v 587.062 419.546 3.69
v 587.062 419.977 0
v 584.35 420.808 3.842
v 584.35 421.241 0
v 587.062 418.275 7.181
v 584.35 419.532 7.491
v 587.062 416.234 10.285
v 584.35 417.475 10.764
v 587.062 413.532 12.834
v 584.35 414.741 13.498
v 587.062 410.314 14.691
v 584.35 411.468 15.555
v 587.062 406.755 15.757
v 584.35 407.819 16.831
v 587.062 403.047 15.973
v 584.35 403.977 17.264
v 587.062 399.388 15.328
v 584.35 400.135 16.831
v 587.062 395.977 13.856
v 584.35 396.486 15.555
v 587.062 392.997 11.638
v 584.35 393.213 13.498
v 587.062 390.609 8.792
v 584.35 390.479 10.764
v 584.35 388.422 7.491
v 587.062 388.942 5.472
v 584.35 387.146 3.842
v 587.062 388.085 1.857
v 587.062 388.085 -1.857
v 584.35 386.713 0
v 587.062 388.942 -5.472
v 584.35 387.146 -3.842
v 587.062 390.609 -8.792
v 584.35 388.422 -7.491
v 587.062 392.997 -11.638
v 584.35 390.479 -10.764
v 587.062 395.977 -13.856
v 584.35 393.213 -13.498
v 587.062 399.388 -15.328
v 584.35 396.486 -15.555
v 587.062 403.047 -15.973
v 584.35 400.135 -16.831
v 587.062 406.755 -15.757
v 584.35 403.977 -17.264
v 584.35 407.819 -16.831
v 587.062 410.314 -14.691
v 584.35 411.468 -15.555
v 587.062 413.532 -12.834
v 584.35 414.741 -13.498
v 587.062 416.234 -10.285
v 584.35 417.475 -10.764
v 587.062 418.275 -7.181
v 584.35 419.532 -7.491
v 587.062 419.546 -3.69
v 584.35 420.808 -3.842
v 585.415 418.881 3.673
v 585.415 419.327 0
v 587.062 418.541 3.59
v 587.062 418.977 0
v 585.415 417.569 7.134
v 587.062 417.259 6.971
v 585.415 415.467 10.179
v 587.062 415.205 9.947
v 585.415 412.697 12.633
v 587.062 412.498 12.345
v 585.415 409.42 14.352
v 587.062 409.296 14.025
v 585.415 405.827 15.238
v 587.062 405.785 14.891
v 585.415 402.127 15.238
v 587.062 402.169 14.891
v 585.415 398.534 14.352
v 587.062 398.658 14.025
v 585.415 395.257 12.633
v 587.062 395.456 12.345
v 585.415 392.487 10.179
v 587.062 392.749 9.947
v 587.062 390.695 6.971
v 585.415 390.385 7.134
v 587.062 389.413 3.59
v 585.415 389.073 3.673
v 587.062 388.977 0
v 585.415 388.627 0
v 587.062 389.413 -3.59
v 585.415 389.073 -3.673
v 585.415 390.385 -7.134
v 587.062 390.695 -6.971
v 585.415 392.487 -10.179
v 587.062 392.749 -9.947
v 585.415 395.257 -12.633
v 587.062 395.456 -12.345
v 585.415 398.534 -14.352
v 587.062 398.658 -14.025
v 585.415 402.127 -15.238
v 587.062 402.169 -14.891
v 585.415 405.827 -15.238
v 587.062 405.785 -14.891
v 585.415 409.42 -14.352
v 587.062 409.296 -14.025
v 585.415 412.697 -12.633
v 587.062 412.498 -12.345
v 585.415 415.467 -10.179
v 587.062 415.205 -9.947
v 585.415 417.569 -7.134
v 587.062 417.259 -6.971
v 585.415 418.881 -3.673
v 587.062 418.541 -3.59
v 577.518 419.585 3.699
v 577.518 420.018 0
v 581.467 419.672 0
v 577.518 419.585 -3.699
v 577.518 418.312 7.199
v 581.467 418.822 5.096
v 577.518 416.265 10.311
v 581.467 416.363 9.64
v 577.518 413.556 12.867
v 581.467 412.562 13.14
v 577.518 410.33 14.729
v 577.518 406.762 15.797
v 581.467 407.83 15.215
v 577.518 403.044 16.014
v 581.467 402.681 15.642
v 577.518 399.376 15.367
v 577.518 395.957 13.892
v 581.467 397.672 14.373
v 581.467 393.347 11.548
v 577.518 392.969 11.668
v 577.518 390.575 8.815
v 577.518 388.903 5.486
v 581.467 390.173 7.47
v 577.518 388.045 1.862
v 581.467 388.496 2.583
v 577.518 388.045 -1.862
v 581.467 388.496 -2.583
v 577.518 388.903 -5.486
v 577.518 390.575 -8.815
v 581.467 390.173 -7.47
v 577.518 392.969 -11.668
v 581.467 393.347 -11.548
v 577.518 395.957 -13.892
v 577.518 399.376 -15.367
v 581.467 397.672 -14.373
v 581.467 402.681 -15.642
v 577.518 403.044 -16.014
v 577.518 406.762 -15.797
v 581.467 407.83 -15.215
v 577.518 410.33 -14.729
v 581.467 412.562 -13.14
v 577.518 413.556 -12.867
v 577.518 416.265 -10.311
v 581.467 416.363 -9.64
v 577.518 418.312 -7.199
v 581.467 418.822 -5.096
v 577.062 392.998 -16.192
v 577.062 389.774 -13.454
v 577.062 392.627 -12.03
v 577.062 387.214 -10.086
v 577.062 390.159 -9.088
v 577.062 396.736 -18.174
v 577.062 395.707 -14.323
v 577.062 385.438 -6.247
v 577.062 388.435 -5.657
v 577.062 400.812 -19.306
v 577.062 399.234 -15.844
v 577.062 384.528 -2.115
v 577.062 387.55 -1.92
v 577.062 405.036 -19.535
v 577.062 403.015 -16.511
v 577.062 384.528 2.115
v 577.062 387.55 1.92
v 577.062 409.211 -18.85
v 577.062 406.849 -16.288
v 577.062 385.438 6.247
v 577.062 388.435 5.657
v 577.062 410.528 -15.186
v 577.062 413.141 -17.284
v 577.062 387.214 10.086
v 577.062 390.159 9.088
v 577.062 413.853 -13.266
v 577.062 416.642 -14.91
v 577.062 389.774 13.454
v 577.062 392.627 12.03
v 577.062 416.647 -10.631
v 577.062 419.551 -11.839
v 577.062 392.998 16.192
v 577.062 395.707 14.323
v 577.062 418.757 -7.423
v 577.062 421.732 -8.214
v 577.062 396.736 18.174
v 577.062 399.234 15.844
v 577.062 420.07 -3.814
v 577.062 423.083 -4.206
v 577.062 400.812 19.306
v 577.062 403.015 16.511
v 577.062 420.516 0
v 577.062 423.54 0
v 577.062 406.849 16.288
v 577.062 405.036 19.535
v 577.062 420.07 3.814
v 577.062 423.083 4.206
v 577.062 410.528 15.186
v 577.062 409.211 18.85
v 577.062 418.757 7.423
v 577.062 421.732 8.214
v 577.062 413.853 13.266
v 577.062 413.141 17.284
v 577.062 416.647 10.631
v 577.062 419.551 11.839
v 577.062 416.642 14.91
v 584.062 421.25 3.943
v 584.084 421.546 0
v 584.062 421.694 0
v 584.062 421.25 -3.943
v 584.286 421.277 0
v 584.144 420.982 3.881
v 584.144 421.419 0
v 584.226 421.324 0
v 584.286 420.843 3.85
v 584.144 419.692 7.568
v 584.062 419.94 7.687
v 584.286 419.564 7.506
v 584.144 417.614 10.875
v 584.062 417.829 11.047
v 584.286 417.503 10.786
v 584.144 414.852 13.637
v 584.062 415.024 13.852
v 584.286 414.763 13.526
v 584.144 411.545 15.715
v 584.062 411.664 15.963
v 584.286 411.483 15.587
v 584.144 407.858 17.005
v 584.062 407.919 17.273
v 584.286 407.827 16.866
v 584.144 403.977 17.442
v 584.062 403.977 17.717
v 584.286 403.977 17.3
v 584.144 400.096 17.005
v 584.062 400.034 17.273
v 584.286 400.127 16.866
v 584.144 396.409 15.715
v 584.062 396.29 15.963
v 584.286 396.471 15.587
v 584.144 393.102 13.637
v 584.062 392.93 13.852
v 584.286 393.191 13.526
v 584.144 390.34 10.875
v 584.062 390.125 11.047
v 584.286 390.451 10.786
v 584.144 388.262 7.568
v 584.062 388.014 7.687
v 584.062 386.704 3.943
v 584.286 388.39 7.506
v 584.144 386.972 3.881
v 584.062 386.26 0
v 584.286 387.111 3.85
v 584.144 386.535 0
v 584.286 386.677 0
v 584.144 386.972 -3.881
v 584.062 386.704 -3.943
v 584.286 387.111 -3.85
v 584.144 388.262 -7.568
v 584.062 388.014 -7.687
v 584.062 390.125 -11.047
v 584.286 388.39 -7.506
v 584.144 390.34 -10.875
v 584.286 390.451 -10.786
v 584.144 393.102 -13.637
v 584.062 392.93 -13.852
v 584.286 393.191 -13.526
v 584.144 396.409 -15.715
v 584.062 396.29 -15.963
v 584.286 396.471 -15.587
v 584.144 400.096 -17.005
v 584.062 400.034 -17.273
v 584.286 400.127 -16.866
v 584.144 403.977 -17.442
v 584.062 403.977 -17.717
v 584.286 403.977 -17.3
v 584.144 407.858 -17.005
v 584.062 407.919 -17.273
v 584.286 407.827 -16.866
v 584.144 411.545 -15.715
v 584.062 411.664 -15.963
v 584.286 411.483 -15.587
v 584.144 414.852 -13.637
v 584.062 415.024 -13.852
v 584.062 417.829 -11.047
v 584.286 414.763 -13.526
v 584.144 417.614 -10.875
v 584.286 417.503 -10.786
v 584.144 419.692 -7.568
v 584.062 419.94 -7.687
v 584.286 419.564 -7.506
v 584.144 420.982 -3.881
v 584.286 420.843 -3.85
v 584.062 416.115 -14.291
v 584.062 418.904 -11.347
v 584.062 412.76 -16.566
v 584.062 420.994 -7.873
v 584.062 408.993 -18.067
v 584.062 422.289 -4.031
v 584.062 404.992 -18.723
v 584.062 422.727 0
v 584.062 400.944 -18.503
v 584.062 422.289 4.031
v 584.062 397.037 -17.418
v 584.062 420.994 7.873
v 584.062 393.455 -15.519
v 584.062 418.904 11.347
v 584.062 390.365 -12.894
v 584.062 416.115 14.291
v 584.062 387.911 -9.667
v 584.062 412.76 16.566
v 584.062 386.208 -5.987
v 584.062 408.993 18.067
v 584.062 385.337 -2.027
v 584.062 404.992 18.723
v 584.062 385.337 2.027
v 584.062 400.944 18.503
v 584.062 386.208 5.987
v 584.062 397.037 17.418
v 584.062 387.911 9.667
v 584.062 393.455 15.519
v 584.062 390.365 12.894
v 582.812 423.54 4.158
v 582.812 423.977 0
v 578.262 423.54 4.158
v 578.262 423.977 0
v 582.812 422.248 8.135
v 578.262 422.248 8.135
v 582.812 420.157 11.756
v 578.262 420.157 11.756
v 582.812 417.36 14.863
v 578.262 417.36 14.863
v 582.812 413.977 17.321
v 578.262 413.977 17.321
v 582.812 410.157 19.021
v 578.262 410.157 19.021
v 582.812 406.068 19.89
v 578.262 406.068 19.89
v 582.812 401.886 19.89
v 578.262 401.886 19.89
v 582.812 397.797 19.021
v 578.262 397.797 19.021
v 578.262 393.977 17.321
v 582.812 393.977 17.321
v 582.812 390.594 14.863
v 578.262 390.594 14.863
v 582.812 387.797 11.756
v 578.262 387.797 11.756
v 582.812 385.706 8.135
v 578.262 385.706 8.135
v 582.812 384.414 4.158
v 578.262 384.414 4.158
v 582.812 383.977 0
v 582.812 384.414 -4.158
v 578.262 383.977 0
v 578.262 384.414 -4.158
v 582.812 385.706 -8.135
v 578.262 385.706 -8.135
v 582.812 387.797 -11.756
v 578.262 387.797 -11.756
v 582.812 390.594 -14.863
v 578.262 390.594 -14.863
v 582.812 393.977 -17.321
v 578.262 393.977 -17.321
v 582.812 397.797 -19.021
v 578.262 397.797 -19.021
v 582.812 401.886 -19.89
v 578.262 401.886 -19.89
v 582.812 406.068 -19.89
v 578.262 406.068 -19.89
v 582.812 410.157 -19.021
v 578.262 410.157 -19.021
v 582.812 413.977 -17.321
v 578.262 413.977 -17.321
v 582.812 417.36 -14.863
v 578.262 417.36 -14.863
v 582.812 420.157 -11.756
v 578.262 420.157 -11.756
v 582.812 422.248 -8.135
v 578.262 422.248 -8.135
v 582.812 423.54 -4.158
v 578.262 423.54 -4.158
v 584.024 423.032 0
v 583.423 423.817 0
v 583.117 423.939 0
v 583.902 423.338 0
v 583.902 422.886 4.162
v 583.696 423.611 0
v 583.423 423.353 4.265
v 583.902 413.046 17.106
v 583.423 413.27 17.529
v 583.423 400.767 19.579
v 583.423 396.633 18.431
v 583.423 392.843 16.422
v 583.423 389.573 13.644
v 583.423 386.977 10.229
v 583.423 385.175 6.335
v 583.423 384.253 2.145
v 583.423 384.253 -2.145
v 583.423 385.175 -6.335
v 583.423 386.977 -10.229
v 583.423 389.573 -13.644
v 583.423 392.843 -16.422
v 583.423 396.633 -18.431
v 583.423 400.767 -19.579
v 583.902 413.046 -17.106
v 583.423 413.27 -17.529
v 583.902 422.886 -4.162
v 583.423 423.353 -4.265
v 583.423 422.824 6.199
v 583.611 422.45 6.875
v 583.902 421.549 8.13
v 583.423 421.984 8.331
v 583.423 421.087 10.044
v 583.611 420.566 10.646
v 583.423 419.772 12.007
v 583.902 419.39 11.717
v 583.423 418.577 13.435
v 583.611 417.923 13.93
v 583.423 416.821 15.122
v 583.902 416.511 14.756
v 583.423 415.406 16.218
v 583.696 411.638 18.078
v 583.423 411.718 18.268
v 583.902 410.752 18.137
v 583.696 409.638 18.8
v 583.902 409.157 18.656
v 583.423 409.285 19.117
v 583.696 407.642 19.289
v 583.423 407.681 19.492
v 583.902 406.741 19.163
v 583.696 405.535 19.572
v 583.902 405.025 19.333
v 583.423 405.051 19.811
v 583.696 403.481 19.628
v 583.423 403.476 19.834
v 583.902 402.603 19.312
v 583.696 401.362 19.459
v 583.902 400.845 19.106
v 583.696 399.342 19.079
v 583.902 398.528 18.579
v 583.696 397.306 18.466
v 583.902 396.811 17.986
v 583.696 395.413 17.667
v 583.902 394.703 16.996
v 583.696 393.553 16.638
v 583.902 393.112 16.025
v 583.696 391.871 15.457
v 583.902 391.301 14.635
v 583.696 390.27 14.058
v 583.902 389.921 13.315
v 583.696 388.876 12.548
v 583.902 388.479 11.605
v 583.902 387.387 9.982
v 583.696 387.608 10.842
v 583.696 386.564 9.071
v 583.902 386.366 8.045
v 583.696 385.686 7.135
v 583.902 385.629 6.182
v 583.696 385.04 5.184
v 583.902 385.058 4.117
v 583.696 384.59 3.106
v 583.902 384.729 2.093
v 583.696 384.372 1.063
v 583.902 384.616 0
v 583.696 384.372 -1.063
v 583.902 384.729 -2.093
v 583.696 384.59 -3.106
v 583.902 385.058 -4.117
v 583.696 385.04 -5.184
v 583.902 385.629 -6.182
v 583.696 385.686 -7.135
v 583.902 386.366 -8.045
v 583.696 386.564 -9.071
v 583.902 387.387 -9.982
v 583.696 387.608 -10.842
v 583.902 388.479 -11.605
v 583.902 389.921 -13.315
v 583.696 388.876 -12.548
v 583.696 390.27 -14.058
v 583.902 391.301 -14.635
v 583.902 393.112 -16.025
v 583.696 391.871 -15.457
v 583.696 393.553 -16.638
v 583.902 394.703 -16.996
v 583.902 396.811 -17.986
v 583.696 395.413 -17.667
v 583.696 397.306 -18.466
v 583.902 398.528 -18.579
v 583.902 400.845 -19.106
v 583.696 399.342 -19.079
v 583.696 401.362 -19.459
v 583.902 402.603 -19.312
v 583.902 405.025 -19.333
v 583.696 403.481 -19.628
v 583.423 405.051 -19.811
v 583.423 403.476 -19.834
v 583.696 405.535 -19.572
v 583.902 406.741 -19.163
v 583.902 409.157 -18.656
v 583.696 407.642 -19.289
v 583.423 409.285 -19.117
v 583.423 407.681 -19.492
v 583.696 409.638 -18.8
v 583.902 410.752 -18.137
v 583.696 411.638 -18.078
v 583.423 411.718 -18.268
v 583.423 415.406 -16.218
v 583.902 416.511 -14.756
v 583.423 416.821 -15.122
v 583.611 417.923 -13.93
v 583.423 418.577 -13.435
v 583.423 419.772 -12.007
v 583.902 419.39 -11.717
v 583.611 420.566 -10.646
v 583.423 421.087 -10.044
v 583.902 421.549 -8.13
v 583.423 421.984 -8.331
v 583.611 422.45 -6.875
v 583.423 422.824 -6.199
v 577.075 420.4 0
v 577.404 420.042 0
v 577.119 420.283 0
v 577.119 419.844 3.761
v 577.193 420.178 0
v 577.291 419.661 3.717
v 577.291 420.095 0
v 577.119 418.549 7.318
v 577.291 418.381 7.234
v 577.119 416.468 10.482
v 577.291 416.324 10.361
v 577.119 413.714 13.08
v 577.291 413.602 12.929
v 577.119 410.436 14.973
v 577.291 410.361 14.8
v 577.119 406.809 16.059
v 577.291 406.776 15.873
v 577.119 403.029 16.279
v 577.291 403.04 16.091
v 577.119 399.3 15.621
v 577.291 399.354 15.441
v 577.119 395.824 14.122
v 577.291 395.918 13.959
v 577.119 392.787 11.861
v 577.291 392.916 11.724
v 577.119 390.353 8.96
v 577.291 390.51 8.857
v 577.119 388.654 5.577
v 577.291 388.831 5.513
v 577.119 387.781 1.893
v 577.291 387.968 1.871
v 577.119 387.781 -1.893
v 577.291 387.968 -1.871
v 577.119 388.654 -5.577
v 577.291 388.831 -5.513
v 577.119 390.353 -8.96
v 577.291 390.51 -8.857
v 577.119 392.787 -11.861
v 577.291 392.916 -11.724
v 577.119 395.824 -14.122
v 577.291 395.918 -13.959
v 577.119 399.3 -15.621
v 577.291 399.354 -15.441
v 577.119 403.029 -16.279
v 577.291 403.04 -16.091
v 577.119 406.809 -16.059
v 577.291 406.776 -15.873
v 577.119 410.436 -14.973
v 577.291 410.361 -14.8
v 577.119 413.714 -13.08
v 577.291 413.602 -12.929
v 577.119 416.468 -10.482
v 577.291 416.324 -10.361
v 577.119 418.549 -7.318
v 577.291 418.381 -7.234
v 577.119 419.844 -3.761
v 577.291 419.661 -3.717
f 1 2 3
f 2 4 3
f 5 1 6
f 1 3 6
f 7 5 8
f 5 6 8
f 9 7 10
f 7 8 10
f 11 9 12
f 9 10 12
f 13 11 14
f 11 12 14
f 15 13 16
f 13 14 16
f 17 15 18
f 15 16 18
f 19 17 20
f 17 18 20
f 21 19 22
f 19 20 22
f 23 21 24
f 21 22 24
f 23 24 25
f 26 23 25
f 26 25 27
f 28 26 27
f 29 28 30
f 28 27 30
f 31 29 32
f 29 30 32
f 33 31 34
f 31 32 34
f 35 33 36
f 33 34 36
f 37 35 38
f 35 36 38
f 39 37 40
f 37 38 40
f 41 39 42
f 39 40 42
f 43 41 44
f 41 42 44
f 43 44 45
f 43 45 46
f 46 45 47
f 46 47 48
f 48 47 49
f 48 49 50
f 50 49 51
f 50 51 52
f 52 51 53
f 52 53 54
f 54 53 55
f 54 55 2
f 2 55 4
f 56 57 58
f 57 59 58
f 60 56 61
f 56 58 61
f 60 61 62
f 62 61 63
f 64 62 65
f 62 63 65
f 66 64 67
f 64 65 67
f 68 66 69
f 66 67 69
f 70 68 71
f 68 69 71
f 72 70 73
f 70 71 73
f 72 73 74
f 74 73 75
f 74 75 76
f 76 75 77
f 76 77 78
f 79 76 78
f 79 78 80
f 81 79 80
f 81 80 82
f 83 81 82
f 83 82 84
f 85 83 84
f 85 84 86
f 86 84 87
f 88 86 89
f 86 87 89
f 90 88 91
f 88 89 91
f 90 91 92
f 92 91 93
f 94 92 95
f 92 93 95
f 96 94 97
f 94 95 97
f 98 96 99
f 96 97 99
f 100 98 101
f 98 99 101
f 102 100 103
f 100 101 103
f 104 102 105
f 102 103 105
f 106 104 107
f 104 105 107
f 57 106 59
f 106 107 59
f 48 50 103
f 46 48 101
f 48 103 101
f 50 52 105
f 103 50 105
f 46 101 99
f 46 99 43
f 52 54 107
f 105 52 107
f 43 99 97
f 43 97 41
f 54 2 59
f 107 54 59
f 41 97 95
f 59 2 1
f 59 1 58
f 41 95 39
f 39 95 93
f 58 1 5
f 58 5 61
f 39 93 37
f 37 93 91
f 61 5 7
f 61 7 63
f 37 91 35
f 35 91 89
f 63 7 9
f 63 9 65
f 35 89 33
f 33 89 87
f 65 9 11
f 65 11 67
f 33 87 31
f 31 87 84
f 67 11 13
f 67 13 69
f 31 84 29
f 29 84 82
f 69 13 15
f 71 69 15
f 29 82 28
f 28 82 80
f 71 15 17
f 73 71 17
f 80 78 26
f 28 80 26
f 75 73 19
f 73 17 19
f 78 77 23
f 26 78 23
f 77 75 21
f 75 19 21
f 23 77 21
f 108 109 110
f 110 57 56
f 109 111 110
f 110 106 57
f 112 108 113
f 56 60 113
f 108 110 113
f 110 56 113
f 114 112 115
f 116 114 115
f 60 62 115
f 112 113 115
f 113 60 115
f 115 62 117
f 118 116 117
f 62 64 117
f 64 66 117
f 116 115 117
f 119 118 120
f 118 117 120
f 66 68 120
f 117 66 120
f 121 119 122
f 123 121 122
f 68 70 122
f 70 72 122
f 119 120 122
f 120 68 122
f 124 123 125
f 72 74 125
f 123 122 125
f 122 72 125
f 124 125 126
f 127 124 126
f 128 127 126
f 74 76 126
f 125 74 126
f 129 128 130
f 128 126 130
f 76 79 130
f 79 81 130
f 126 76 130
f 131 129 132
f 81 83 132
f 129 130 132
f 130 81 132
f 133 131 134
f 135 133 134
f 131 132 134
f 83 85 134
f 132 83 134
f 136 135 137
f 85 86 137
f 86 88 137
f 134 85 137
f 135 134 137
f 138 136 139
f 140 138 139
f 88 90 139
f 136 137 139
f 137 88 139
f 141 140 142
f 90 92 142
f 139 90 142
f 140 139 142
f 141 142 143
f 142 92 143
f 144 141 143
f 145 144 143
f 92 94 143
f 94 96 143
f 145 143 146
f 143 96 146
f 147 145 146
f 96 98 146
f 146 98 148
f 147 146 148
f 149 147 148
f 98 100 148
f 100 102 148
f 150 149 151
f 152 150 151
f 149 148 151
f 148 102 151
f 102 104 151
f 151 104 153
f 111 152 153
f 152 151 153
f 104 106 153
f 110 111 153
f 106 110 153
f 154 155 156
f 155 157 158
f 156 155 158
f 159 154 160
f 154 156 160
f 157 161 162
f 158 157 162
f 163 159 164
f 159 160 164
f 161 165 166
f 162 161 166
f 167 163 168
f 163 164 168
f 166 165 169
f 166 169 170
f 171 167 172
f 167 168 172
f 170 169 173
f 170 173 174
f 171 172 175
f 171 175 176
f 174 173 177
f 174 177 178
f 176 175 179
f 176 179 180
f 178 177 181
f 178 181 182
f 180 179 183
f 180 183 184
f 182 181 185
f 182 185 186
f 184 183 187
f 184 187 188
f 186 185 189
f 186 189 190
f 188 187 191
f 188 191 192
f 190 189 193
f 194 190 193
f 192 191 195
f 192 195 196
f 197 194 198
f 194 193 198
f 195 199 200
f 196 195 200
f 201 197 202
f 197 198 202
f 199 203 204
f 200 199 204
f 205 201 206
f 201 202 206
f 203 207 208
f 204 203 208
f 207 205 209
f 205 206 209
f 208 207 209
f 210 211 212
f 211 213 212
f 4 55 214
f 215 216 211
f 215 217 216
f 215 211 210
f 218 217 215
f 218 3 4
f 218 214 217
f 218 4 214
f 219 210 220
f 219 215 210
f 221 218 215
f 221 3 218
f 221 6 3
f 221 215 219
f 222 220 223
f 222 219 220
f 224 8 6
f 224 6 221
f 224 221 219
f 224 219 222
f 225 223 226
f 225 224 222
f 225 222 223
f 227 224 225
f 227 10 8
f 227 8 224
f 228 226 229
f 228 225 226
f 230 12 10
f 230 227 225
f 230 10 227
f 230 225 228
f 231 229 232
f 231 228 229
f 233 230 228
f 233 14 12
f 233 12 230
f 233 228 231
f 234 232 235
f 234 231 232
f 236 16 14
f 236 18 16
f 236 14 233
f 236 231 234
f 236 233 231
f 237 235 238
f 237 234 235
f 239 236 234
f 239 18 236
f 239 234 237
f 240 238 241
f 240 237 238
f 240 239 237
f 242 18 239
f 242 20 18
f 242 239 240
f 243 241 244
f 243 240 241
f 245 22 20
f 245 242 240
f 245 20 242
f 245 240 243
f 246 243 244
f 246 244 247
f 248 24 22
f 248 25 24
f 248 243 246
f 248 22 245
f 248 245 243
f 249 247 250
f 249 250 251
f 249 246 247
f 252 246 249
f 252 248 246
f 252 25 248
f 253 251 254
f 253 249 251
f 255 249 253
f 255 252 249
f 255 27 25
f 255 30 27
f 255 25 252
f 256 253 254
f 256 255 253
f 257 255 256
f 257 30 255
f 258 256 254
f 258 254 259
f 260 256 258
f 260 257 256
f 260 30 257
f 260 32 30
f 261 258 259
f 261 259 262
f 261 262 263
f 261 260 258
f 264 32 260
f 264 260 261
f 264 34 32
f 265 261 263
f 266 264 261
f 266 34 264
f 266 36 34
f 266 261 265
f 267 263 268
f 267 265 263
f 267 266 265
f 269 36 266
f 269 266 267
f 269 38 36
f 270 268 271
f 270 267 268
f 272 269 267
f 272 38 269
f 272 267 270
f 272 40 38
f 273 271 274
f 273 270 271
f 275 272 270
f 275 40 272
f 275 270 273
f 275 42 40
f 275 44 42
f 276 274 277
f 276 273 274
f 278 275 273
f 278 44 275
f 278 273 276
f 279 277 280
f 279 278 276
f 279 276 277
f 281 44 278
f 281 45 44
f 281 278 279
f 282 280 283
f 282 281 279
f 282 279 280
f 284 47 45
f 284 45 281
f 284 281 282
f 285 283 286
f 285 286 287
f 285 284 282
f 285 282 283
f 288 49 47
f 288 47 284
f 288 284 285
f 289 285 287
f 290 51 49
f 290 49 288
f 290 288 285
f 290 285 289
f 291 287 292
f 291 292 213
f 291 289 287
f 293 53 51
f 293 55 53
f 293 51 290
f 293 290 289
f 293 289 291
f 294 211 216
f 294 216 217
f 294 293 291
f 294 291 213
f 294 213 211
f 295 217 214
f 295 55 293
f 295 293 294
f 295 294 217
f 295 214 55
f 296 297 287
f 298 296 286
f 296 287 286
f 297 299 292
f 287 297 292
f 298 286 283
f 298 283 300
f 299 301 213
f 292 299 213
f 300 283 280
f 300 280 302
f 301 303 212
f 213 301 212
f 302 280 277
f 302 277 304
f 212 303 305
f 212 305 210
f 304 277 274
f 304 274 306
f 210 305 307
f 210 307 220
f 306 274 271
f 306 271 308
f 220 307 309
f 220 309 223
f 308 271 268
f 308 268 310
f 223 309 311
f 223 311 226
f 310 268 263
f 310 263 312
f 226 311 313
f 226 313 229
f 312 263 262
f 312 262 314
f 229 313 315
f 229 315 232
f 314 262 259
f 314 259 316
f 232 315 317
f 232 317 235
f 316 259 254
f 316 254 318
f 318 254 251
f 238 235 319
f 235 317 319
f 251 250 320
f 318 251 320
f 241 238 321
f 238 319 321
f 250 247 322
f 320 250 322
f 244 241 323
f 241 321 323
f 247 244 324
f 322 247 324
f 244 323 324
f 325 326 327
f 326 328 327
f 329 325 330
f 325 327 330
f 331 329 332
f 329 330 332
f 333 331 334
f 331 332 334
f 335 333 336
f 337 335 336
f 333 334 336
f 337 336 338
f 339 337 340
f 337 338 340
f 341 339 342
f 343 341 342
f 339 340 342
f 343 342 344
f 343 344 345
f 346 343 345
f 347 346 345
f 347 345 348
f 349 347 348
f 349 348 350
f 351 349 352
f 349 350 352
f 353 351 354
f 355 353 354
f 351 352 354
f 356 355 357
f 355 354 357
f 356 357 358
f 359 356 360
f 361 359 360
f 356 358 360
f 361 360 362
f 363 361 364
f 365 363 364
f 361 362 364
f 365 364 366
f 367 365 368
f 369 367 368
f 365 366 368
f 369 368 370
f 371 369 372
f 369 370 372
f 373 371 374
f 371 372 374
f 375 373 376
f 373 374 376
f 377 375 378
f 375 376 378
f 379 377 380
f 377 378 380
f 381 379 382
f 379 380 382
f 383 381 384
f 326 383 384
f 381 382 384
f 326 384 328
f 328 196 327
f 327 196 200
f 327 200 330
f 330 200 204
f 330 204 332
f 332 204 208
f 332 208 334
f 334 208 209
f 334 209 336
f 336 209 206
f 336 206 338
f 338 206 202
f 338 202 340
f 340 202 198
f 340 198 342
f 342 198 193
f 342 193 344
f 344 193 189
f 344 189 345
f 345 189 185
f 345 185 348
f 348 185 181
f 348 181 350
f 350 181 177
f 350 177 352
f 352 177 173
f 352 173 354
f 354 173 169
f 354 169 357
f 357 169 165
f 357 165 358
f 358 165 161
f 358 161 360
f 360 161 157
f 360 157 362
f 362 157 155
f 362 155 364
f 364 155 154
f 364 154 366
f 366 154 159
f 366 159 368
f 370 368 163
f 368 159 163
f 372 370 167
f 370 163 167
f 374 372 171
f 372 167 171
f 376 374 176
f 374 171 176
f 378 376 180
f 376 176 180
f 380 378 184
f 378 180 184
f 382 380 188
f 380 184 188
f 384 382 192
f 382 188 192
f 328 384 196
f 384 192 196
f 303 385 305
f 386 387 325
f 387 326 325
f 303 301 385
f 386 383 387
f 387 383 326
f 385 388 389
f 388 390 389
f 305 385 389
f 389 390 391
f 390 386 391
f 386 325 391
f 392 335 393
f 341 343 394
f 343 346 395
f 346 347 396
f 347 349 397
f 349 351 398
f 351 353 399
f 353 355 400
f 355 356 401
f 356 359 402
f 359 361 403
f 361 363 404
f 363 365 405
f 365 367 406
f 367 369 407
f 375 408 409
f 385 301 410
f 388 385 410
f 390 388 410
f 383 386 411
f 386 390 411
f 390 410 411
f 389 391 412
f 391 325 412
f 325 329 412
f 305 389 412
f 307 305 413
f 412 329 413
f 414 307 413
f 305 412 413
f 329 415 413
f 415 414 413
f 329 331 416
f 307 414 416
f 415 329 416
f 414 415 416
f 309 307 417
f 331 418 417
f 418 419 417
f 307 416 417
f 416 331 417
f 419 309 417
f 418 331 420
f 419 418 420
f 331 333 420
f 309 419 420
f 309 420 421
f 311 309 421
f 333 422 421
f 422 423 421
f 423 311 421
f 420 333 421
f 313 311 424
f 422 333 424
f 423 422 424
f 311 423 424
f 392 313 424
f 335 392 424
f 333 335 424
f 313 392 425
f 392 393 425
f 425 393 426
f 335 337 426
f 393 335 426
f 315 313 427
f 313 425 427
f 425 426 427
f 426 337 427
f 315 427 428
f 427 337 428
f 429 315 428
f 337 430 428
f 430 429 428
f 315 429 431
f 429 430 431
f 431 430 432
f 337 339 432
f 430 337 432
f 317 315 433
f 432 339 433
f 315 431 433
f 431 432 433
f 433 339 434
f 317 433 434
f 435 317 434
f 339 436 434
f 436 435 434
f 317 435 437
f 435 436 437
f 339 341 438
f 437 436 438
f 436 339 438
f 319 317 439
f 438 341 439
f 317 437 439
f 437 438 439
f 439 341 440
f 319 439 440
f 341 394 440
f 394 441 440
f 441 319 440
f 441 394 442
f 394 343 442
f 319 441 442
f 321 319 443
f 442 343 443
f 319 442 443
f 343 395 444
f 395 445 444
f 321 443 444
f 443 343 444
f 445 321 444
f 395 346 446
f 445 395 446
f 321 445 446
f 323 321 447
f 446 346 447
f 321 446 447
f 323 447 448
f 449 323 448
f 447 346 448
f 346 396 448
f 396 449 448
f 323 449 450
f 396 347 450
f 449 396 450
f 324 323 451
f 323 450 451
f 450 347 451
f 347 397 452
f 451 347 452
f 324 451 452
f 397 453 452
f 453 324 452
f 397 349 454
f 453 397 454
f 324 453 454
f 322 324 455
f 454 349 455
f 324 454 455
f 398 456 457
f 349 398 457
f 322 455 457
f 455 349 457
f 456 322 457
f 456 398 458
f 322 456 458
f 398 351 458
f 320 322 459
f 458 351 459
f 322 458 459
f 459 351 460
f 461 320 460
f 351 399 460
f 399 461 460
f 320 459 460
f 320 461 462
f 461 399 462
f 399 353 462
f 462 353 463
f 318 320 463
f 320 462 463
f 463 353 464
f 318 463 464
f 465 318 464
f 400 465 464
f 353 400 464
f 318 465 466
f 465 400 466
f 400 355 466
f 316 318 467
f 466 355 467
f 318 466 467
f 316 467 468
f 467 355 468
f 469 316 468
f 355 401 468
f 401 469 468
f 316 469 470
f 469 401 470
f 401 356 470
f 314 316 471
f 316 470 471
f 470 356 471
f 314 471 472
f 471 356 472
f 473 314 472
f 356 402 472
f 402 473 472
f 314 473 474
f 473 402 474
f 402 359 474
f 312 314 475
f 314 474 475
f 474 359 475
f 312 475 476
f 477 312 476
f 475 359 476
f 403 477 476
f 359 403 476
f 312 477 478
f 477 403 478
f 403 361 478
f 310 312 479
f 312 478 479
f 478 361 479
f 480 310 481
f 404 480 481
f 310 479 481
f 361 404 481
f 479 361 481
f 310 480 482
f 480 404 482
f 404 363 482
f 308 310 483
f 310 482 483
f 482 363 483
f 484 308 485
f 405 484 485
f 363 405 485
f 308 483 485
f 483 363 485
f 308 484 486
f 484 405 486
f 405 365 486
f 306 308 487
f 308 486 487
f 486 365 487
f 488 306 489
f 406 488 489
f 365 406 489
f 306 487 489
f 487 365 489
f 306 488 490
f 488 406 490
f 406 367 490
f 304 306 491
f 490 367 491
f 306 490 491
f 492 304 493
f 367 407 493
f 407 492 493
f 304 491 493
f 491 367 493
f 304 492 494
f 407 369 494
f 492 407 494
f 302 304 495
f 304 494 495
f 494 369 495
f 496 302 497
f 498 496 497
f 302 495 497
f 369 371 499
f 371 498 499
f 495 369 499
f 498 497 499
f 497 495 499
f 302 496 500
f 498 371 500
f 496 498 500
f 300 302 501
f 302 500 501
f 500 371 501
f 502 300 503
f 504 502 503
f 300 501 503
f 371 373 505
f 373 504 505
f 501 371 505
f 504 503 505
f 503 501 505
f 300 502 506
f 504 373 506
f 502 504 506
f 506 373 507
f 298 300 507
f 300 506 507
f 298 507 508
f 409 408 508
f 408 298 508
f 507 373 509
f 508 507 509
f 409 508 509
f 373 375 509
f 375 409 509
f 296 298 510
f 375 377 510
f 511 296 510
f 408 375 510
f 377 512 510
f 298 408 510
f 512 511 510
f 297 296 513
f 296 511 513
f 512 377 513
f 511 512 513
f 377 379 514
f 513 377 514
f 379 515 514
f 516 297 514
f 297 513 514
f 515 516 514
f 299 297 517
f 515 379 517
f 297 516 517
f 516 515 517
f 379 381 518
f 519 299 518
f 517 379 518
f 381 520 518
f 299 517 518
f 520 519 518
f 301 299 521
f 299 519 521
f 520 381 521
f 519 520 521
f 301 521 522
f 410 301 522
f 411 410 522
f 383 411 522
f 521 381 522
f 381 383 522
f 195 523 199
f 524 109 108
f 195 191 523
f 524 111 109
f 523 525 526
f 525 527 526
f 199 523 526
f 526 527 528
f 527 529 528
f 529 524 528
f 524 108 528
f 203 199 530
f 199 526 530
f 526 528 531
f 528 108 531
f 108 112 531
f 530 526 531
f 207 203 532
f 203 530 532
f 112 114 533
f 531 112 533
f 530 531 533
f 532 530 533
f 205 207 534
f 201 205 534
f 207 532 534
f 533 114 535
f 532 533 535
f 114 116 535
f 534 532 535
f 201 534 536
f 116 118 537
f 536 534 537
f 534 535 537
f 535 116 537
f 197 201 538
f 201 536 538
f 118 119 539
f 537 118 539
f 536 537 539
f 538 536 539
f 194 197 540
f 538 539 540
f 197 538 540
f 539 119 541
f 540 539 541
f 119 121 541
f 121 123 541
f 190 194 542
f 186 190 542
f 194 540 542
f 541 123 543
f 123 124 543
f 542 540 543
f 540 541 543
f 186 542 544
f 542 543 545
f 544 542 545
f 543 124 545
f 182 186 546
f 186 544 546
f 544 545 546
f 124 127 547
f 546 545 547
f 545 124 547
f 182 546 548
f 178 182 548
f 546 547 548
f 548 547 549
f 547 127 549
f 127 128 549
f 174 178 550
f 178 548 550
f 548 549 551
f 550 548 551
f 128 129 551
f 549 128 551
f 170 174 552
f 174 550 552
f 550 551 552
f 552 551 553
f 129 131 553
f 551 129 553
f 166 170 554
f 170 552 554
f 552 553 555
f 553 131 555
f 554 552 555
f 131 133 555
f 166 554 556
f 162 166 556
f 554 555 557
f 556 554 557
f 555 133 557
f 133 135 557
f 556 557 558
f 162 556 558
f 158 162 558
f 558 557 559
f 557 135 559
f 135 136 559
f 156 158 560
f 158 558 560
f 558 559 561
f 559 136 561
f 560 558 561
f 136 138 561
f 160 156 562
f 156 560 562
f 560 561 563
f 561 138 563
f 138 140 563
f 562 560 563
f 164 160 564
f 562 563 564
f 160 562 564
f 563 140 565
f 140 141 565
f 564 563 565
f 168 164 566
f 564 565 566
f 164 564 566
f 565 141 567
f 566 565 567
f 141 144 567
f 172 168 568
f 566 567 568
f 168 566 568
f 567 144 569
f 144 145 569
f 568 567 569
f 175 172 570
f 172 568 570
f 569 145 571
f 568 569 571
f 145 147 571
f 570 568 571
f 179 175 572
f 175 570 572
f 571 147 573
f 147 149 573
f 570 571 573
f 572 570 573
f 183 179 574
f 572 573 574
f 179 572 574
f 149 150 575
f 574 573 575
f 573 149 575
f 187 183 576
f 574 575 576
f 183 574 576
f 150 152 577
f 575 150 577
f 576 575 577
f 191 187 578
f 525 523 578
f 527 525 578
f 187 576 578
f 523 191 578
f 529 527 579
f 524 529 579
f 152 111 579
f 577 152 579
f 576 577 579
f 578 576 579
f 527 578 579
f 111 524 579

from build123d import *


with BuildPart() as part:
    # Sketch1 → Revolve1 (revolve)
    with BuildSketch(Plane.XY):
        with BuildLine():
            Line((577.061665053, 423.226990018), (577.061665053, 420.51598161))
            add(Edge.make_bspline(
                [(577.061665053, 420.51598161), (577.061665053, 420.242966746), (577.246111222, 420.041679075), (577.518087182, 420.017884261)],
                knots=[0, 0, 0, 0, 1, 1, 1, 1], degree=3, weights=[1, 0.824851558, 0.824851558, 1]))
            Line((577.518087182, 420.017884261), (585.415044515, 419.326990018))
            Line((585.415044515, 419.326990018), (587.061665053, 418.976990018))
            Line((587.061665053, 418.976990018), (587.061665053, 419.976990018))
            Line((587.061665053, 419.976990018), (584.350355922, 421.24129423))
            add(Edge.make_bspline(
                [(584.061665053, 421.694448123), (584.061665053, 421.494469327), (584.169113582, 421.325808921), (584.350355922, 421.24129423)],
                knots=[0, 0, 0, 0, 1, 1, 1, 1], degree=3, weights=[1, 0.895594297, 0.895594297, 1]))
            Line((584.061665053, 421.694448123), (584.061665053, 422.726990018))
            add(Edge.make_bspline(
                [(584.061665053, 422.726990018), (584.061665053, 423.459223065), (583.5438981, 423.976990018), (582.811665053, 423.976990018)],
                knots=[0, 0, 0, 0, 1, 1, 1, 1], degree=3, weights=[1, 0.804737854, 0.804737854, 1]))
            Line((582.811665053, 423.976990018), (578.261665053, 423.976990018))
            Line((578.261665053, 423.976990018), (577.061665053, 423.540225737))
            Line((577.061665053, 423.540225737), (577.061665053, 423.226990018))
        make_face()
    revolve(axis=Axis((577.061665053, 403.976990018, 0), (1, 0, 0)))


solid = part.part
